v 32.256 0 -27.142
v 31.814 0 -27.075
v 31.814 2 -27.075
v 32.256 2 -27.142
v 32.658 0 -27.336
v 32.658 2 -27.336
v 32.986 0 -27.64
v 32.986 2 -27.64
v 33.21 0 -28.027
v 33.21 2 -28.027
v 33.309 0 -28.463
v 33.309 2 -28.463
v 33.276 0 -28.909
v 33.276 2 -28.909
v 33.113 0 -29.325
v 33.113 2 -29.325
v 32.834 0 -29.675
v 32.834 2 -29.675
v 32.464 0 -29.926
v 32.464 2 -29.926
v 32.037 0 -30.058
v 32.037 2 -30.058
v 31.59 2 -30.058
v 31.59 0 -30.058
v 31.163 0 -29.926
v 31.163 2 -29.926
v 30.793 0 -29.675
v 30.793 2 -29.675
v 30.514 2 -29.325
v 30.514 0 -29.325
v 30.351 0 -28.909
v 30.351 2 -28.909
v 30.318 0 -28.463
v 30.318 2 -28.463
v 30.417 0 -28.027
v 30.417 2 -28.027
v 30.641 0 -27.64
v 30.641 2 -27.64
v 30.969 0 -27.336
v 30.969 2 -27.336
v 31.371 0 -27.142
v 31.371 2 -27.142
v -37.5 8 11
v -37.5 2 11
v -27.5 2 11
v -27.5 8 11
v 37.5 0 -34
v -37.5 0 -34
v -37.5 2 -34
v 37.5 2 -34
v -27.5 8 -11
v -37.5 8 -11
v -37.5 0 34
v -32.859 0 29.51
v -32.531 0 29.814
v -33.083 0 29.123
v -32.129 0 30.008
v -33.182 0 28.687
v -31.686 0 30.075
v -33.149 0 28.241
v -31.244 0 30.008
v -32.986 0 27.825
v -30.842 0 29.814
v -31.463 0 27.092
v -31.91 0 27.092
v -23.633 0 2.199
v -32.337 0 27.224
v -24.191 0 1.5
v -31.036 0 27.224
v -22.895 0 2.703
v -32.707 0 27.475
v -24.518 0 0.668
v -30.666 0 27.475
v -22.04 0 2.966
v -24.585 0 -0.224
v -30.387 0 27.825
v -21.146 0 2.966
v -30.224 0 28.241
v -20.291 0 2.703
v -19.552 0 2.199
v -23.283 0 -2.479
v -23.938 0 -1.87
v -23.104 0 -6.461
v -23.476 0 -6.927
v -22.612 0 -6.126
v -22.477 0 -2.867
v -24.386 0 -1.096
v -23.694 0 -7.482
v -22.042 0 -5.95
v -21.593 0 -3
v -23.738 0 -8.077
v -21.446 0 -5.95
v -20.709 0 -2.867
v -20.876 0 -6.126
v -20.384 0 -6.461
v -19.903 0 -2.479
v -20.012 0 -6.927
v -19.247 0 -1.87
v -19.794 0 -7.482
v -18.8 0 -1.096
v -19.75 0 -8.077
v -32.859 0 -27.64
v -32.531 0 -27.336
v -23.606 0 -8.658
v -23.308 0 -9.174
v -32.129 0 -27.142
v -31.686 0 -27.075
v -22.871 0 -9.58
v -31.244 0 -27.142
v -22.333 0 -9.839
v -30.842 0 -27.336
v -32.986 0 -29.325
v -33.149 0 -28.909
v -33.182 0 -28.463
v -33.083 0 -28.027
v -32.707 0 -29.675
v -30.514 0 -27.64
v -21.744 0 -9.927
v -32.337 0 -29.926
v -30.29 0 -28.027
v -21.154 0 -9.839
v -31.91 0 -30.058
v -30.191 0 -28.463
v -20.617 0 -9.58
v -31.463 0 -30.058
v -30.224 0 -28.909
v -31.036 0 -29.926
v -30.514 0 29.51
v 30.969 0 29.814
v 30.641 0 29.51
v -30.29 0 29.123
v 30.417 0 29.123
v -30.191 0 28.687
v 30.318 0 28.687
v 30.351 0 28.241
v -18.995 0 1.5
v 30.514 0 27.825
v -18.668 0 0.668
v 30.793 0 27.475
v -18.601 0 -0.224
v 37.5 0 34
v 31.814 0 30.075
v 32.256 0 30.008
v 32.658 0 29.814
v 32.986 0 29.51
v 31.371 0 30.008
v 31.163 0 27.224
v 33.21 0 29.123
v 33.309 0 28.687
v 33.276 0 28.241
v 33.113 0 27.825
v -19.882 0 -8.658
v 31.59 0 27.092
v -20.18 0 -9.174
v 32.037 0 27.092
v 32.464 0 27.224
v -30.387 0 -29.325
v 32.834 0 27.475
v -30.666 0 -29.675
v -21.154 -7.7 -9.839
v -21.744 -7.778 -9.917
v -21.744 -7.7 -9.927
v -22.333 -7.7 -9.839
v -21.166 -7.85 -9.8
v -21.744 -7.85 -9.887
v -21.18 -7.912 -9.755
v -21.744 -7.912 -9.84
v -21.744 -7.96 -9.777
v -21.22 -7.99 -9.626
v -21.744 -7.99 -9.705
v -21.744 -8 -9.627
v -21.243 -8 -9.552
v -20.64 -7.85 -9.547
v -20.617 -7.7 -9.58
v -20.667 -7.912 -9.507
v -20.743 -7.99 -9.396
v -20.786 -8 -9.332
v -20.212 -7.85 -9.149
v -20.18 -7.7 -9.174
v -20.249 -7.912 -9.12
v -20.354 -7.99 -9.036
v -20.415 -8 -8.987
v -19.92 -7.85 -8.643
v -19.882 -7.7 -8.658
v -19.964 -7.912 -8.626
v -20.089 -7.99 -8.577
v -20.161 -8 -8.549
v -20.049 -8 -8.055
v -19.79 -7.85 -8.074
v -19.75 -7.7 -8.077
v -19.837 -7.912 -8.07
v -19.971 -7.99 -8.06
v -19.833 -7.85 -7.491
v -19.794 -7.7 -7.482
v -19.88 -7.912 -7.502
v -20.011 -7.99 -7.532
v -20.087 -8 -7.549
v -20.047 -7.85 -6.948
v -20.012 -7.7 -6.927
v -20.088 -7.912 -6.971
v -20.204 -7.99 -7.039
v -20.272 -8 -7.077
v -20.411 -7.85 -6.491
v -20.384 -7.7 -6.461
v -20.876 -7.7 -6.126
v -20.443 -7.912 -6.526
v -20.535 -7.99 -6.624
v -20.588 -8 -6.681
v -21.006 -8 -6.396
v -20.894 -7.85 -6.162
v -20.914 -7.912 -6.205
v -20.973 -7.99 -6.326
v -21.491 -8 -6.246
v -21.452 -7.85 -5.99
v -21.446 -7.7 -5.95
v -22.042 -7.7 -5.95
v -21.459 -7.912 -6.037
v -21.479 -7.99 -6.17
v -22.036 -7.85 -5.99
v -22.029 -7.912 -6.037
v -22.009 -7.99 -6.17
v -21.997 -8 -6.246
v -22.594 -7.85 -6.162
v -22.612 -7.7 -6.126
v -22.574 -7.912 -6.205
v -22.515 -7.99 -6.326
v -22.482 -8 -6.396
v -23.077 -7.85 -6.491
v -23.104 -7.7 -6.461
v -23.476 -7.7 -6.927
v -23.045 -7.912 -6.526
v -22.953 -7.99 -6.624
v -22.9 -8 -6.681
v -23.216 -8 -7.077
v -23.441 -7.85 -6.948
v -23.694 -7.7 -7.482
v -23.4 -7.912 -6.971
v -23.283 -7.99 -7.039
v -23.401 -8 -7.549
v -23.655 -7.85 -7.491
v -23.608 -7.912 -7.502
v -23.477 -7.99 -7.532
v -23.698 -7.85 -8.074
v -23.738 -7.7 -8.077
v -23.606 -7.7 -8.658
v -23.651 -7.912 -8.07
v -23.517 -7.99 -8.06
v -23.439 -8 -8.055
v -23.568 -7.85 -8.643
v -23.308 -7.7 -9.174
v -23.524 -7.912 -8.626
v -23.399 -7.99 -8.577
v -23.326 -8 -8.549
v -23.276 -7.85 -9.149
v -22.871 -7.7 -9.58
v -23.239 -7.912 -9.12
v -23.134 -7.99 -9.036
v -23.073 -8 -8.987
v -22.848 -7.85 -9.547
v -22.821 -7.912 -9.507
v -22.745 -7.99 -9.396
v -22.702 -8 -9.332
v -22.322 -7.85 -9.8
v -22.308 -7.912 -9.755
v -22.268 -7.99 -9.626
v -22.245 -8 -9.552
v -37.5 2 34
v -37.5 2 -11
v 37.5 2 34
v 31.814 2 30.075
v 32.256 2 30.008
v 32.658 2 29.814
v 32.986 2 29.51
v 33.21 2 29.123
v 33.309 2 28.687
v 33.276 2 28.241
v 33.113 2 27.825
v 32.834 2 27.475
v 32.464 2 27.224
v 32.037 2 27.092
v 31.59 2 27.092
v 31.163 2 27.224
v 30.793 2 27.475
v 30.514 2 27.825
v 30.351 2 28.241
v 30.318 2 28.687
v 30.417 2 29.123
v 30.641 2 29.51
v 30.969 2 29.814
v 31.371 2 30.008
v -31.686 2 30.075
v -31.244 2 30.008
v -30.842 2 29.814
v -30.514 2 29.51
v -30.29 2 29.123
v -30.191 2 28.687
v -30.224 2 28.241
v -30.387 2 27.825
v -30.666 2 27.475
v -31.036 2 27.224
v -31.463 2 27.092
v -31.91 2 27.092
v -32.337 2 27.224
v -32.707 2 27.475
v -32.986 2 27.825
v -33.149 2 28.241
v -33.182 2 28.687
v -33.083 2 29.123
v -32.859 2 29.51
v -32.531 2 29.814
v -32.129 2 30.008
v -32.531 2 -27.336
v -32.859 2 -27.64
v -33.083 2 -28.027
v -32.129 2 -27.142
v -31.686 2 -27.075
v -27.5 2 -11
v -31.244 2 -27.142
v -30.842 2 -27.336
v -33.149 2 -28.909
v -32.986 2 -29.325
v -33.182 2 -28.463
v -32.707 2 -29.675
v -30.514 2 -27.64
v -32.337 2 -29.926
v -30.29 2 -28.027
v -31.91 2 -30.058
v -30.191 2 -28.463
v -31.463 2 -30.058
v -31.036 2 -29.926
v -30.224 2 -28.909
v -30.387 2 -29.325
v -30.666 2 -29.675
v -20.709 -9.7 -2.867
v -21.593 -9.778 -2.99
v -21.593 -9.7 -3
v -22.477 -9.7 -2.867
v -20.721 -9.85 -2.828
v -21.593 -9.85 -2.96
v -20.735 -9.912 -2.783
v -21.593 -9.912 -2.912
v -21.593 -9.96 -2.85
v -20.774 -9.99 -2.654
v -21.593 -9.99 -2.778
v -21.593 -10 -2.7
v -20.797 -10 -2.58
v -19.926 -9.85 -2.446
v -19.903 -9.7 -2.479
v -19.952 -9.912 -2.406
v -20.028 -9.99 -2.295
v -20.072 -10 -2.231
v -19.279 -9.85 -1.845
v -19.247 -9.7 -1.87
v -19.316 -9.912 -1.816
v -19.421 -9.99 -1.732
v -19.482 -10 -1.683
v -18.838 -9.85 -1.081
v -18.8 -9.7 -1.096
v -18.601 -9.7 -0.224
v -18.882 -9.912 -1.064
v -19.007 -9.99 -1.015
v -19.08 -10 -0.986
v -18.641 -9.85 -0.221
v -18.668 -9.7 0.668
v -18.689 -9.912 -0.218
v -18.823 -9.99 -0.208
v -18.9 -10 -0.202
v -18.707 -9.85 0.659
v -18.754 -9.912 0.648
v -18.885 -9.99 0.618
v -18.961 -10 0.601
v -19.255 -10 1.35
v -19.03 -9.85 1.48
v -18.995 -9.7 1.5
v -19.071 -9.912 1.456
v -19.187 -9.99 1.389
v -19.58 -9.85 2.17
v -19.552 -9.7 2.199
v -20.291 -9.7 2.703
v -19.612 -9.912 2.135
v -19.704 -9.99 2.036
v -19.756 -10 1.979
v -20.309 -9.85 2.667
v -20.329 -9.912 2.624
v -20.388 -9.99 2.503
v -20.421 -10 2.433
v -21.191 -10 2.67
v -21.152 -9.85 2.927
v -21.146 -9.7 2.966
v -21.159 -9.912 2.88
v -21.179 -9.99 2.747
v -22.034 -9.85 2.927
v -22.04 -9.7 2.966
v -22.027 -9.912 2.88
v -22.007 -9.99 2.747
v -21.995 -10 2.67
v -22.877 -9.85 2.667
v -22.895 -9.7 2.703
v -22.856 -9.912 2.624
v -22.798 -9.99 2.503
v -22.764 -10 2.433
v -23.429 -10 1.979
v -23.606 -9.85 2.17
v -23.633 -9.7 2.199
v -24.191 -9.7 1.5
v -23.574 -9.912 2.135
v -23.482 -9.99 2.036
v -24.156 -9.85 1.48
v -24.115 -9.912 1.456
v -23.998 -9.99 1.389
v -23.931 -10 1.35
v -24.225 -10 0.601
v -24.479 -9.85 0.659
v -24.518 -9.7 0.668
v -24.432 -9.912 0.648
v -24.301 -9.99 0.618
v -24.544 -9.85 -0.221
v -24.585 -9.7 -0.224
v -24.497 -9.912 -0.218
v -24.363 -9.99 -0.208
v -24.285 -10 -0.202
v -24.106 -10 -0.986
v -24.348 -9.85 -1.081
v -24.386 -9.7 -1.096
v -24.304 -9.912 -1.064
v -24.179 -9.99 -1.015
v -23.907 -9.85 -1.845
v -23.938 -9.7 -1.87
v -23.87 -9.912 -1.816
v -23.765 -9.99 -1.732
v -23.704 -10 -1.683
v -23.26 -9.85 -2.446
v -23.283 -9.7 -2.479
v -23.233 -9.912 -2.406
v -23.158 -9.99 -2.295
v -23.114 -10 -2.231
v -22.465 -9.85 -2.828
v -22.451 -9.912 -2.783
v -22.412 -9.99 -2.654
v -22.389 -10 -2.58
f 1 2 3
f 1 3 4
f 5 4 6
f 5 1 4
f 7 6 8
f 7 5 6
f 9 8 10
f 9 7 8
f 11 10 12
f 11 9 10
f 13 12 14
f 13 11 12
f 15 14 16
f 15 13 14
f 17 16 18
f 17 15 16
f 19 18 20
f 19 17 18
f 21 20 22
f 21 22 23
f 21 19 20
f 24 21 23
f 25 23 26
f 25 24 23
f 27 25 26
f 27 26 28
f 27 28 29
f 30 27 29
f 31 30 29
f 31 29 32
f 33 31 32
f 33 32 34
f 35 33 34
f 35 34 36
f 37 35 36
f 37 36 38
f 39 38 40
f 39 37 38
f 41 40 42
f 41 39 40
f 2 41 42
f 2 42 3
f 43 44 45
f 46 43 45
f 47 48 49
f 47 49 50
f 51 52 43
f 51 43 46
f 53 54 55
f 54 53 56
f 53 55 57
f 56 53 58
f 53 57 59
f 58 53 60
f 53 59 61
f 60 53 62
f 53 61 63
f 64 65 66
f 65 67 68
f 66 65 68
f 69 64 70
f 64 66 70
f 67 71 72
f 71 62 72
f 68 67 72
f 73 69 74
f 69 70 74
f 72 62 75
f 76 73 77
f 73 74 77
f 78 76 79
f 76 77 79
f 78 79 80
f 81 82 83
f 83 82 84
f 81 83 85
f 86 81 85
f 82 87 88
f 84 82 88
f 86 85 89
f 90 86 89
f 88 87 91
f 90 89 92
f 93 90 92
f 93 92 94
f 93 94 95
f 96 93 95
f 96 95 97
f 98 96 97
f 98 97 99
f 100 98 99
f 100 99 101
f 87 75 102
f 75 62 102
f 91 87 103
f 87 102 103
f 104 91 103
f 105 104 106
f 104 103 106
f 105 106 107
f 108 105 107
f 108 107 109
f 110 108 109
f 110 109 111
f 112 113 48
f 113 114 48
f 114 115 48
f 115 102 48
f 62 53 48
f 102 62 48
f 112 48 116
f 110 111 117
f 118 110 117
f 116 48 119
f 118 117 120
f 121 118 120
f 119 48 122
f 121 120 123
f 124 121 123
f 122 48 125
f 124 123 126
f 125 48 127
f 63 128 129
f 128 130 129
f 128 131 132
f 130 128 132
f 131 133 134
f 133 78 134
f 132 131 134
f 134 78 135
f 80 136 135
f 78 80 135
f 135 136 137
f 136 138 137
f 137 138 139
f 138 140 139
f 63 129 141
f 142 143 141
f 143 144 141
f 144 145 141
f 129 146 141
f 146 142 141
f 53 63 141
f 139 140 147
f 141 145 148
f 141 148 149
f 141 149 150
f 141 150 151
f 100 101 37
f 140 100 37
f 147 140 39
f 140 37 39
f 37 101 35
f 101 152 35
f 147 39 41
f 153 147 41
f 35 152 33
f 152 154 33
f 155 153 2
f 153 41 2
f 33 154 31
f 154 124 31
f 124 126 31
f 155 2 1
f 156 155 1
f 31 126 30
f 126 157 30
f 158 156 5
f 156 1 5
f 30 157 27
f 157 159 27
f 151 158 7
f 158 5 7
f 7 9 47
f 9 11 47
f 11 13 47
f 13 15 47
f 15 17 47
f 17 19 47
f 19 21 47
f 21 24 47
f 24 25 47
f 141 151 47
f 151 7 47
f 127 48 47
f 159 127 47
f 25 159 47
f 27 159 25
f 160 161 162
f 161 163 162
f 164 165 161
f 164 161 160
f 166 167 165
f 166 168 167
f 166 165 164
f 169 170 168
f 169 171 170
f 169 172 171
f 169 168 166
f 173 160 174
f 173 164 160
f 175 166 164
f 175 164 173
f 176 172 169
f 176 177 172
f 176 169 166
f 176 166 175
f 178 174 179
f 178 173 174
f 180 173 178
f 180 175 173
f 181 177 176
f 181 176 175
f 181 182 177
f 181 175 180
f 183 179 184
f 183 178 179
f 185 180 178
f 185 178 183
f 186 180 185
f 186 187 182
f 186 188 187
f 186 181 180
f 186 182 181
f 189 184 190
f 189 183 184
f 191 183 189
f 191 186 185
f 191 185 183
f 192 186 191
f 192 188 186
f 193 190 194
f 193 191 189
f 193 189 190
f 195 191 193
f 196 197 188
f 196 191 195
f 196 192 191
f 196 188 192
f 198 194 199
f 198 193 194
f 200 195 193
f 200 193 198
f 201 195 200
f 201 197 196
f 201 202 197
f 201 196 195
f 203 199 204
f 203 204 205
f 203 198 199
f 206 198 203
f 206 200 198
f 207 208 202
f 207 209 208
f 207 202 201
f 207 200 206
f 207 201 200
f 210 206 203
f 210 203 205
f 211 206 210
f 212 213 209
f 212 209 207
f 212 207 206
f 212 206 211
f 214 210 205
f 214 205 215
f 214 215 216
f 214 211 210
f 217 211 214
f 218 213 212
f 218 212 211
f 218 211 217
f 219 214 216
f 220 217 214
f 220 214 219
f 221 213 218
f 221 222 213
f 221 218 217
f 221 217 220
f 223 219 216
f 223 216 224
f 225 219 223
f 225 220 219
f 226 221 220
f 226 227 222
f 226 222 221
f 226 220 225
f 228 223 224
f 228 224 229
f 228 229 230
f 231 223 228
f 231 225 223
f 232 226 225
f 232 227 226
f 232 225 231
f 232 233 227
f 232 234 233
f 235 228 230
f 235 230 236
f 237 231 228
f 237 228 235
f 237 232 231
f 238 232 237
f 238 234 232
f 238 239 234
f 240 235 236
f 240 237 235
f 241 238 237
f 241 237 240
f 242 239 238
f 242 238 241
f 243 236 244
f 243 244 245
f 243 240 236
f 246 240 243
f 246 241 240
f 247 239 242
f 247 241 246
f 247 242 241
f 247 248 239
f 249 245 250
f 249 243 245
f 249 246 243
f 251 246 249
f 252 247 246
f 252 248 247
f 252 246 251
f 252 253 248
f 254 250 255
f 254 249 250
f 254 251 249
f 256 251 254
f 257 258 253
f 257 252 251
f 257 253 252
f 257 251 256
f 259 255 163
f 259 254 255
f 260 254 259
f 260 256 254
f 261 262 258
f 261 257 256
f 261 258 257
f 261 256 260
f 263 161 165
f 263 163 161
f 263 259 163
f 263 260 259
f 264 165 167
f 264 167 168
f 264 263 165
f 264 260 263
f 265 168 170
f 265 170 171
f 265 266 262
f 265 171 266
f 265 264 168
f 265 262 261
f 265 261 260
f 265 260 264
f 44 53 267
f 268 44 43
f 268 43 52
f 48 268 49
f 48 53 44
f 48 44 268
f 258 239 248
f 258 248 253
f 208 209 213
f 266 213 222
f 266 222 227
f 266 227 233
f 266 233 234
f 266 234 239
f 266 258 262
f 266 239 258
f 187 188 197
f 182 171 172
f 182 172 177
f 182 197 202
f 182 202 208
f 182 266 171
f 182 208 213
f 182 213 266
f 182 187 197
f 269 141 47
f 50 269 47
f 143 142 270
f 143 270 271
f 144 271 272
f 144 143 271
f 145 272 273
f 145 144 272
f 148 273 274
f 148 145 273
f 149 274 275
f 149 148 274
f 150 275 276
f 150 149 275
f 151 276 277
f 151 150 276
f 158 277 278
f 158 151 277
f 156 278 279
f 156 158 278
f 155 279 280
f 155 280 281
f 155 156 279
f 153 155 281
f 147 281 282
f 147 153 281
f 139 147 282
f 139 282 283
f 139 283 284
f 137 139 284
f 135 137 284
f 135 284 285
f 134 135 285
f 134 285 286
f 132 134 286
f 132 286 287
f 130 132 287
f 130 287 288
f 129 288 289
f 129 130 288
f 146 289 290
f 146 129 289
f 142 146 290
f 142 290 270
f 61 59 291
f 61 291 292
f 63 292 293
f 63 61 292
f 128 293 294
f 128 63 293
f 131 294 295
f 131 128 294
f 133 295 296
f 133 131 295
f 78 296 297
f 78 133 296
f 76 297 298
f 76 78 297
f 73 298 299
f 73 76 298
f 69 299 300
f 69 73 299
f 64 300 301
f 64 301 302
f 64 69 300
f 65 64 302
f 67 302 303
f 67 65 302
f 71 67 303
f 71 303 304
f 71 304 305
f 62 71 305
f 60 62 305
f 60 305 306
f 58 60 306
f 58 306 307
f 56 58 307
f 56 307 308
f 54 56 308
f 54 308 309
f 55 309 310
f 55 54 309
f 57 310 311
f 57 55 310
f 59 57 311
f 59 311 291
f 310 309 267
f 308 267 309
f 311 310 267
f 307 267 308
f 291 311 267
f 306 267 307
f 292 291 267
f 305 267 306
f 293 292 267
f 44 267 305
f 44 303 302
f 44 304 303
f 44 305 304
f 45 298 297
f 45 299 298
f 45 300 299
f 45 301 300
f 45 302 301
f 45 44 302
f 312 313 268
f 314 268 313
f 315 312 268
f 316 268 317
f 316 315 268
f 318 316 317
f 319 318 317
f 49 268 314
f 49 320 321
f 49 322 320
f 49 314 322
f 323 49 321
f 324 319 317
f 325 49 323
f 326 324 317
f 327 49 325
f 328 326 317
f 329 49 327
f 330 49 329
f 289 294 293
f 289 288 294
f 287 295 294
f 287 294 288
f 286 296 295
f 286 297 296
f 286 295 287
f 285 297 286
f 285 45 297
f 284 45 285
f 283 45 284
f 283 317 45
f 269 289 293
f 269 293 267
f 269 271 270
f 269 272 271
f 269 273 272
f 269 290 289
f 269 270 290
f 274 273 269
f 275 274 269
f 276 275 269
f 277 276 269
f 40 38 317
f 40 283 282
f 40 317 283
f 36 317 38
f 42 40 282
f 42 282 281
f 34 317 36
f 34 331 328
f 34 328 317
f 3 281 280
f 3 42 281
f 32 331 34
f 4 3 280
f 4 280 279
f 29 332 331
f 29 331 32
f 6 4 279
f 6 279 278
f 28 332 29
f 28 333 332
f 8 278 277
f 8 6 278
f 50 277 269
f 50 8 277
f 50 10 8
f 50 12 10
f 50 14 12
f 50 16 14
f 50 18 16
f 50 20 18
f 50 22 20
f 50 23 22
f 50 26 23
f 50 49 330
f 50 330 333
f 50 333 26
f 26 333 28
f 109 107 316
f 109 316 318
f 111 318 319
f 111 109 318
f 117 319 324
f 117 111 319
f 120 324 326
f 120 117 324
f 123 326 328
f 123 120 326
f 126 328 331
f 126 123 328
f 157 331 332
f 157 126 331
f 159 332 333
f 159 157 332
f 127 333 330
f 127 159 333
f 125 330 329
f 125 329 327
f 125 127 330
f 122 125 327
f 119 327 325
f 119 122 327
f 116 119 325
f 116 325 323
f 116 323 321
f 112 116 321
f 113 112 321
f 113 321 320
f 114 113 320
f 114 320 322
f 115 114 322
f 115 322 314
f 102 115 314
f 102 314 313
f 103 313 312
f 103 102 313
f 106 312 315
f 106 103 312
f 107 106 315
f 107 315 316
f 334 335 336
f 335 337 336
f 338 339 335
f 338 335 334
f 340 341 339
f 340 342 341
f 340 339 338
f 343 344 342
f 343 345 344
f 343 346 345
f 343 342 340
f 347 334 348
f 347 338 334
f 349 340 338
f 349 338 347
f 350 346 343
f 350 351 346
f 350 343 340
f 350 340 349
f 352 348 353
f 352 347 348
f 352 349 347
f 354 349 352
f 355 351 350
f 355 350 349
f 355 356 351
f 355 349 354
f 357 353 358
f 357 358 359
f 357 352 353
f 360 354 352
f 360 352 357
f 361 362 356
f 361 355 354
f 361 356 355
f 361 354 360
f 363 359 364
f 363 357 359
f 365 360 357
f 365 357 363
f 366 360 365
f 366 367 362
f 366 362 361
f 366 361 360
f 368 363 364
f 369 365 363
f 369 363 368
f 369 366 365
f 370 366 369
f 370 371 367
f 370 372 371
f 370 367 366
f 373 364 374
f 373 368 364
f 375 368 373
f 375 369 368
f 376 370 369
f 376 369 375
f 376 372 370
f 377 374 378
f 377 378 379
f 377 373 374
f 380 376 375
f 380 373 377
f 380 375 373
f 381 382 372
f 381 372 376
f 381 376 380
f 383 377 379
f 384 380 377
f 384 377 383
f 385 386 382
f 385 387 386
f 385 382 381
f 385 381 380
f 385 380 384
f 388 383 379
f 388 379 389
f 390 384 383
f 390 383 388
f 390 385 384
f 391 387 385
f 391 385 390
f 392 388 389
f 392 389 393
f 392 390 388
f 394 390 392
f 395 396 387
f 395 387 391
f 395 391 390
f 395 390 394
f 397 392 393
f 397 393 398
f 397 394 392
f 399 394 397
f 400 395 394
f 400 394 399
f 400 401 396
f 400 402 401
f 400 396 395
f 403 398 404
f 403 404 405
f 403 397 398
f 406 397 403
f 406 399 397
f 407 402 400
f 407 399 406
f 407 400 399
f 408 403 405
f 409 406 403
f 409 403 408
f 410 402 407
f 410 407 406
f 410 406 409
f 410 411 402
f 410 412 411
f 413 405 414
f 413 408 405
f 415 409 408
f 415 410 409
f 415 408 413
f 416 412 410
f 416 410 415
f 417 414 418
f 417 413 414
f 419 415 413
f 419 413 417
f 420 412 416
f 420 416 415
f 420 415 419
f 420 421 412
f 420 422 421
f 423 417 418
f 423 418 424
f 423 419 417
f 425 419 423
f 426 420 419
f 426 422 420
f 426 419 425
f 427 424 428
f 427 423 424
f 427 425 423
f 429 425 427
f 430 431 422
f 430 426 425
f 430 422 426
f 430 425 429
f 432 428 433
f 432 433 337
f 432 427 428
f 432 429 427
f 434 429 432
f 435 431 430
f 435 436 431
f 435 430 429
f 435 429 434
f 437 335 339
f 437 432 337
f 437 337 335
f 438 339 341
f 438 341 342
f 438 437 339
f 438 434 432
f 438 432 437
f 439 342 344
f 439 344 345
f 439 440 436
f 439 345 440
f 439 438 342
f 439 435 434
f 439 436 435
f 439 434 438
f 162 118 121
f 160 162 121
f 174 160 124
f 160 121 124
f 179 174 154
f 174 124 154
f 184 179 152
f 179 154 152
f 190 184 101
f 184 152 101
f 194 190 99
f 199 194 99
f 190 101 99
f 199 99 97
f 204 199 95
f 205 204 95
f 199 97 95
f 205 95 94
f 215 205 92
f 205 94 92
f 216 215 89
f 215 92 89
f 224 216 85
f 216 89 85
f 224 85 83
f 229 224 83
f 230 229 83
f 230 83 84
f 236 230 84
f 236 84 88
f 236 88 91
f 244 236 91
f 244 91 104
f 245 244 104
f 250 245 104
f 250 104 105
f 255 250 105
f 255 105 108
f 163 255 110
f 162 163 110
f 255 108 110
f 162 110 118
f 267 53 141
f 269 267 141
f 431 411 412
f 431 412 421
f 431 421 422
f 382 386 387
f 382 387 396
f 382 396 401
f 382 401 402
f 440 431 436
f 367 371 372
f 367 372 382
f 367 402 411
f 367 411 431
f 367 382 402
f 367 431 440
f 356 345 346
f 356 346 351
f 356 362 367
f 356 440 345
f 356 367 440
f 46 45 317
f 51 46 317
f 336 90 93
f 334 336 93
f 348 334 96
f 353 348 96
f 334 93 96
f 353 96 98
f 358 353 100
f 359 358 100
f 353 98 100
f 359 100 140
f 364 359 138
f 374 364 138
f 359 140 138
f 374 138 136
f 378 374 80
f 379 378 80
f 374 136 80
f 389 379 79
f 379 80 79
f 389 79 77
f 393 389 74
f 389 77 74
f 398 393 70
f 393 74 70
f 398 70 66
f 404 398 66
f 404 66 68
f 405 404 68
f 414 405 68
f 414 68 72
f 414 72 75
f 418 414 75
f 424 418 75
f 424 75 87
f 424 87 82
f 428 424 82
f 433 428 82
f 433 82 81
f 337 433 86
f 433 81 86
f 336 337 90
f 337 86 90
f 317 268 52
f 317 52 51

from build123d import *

# Parameters (mm, degrees)
SKETCH1_W           = 75
SKETCH1_H           = 68
SKETCH1_R           = 1.5
BOSS_EXTRUDE1_DEPTH = 2
SKETCH2_R           = 3
BOSS_EXTRUDE2_DEPTH = 10
SKETCH3_R           = 2
BOSS_EXTRUDE3_DEPTH = 8
FILLET1_R           = 0.3
SKETCH4_W           = 10
SKETCH4_H           = 22
BOSS_EXTRUDE4_DEPTH = 6


with BuildPart() as part:
    # Sketch1 → Boss-Extrude1 (new body)
    with BuildSketch(Plane(origin=(0, 0, 0), x_dir=(1, 0, 0), z_dir=(0, 1, 0))):
        Rectangle(SKETCH1_W, SKETCH1_H)
        with Locations(Location((31.8135, 28.575, 0), (0, 0, 270))):
            Circle(SKETCH1_R, mode=Mode.SUBTRACT)
        with Locations(Location((31.8135, -28.575, 0), (0, 0, 270))):
            Circle(SKETCH1_R, mode=Mode.SUBTRACT)
        with Locations(Location((-31.6865, 28.575, 0), (0, 0, 270))):
            Circle(SKETCH1_R, mode=Mode.SUBTRACT)
        with Locations(Location((-31.6865, -28.575, 0), (0, 0, 270))):
            Circle(SKETCH1_R, mode=Mode.SUBTRACT)
    extrude(amount=BOSS_EXTRUDE1_DEPTH)

    # Sketch2 → Boss-Extrude2 (add)
    with BuildSketch(Plane.XZ):
        with Locations(Location((-21.592923404, 0, 0), (0, 0, 270))):
            Circle(SKETCH2_R)
    extrude(amount=BOSS_EXTRUDE2_DEPTH)

    # Sketch3 → Boss-Extrude3 (add)
    with BuildSketch(Plane.XZ):
        with Locations(Location((-21.743922868, -7.927471879, 0), (0, 0, 270))):
            Circle(SKETCH3_R)
    extrude(amount=BOSS_EXTRUDE3_DEPTH)

    # Fillet1
    fillet1_edges = [part.edges().sort_by_distance(p)[0] for p in [
        (-21.592923404, -10, 3),
        (-21.743922868, -8, -5.927471879),
    ]]
    fillet(fillet1_edges, radius=FILLET1_R)

    # Sketch4 → Boss-Extrude4 (add)
    with BuildSketch(Plane(origin=(0, 2, 0), x_dir=(1, 0, 0), z_dir=(0, 1, 0))):
        with Locations((-32.5, 0)):
            Rectangle(SKETCH4_W, SKETCH4_H)
    extrude(amount=BOSS_EXTRUDE4_DEPTH)


solid = part.part
